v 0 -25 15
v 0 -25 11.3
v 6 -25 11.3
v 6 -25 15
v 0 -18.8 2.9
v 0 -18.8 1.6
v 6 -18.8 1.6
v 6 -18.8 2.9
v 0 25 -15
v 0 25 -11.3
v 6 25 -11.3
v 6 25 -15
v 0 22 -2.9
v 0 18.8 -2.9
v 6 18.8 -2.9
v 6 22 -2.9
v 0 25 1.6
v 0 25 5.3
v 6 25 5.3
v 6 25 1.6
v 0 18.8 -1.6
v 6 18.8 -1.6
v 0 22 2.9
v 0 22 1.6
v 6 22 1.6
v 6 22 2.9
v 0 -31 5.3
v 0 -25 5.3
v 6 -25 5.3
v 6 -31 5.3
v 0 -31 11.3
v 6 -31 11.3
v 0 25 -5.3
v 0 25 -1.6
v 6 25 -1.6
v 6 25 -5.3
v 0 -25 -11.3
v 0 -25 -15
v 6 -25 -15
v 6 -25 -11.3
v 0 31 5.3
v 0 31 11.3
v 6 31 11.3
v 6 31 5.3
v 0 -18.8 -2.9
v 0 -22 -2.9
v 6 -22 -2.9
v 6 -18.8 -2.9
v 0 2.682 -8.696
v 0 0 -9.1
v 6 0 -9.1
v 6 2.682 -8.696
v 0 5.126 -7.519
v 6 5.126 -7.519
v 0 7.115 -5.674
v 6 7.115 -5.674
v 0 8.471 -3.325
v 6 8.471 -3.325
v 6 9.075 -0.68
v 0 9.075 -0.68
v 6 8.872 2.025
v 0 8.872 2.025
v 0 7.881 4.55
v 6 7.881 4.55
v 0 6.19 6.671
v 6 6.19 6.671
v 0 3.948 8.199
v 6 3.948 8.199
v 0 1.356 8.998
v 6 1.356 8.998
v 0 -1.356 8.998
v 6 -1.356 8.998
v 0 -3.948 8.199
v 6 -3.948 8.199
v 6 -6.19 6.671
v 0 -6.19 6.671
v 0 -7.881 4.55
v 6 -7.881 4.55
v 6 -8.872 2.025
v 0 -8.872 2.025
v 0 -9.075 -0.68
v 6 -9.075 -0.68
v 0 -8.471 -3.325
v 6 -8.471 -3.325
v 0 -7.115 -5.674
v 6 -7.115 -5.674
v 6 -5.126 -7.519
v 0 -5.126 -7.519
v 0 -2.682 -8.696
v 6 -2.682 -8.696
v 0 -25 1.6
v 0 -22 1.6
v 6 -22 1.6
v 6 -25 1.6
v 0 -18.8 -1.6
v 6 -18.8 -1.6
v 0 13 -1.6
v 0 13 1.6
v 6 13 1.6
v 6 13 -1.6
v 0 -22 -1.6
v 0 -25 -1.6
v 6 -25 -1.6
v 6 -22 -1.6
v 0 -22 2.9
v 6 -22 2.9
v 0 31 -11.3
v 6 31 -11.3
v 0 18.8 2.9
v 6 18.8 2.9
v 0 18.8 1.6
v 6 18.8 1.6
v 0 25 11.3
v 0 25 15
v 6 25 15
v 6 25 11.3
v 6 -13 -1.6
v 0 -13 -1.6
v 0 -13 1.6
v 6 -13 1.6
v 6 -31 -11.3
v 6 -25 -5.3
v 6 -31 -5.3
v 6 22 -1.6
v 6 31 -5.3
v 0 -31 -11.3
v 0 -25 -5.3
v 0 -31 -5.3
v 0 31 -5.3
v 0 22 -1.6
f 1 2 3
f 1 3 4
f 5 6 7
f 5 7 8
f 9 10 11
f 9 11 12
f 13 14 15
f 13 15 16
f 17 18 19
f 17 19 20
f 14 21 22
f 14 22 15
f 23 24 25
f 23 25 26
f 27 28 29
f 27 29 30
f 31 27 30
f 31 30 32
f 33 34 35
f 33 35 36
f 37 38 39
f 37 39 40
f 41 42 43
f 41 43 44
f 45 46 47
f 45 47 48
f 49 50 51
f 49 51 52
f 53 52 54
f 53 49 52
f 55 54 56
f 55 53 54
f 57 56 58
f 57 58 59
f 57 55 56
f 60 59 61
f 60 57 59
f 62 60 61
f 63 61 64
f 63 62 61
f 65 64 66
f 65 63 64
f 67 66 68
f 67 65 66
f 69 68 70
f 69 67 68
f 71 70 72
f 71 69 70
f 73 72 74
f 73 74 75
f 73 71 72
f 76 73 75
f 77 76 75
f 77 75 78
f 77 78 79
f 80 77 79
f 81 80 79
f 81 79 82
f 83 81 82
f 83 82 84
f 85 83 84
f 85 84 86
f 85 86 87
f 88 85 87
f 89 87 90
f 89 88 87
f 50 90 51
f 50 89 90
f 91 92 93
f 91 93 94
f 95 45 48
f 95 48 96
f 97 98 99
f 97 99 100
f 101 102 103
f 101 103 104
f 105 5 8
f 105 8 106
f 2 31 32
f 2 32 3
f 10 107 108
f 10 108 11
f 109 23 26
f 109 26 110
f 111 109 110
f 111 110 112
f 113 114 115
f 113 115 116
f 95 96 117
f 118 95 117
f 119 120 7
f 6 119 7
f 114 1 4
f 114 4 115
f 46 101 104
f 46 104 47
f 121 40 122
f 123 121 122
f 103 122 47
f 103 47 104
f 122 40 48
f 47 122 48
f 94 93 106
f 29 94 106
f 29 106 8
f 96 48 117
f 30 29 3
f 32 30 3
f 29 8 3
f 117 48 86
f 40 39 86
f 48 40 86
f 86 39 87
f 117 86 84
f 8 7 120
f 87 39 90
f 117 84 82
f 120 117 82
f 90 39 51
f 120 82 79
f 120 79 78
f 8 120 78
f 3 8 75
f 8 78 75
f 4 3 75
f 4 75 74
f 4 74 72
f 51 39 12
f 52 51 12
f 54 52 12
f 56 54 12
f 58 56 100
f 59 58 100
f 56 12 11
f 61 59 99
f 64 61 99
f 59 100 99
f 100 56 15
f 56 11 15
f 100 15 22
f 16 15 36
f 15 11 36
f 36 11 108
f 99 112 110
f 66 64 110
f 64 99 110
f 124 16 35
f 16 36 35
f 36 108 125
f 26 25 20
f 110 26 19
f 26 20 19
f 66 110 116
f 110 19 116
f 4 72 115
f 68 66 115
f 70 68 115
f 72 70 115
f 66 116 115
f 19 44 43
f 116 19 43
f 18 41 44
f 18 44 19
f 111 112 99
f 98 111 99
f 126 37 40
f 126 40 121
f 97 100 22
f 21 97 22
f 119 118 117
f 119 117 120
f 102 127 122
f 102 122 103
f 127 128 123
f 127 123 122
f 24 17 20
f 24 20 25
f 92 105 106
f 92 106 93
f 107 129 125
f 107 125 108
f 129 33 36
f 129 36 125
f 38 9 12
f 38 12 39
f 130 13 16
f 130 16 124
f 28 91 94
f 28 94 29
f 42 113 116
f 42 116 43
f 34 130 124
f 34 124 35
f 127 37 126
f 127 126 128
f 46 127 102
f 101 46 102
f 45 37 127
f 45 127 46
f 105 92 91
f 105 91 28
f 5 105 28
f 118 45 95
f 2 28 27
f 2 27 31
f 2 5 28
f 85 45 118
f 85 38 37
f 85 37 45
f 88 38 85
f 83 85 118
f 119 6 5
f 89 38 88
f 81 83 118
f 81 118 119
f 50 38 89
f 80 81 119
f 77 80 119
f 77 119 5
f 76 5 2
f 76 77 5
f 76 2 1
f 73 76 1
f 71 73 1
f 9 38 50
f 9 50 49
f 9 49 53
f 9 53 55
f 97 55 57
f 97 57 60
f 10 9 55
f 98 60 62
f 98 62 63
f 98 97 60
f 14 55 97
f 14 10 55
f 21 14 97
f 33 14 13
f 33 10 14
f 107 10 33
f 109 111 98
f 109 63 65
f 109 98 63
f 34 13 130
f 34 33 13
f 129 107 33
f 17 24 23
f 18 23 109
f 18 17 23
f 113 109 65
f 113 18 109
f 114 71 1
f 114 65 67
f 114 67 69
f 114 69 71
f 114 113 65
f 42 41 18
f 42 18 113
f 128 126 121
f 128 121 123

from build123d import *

# Parameters (mm, degrees)
SKETCH1_R           = 9.1
BOSS_EXTRUDE1_DEPTH = 6


with BuildPart() as part:
    # Sketch1 → Boss-Extrude1 (new body)
    with BuildSketch(Plane(origin=(0, 0, 0), x_dir=(0, 0, -1), z_dir=(1, 0, 0))):
        Polygon((-15, -25), (-15, 25), (-11.3, 25), (-11.3, 31), (-5.3, 31), (-5.3, 25), (-1.6, 25), (-1.6, 22), (-2.9, 22), (-2.9, 18.8), (-1.6, 18.8), (-1.6, 13), (1.6, 13), (1.6, 18.8), (2.9, 18.8), (2.9, 22), (1.6, 22), (1.6, 25), (5.3, 25), (5.3, 31), (11.3, 31), (11.3, 25), (15, 25), (15, -25), (11.3, -25), (11.3, -31), (5.3, -31), (5.3, -25), (1.6, -25), (1.6, -22), (2.9, -22), (2.9, -18.8), (1.6, -18.8), (1.6, -13), (-1.6, -13), (-1.6, -18.8), (-2.9, -18.8), (-2.9, -22), (-1.6, -22), (-1.6, -25), (-5.3, -25), (-5.3, -31), (-11.3, -31), (-11.3, -25), align=None)
        Circle(SKETCH1_R, mode=Mode.SUBTRACT)
    extrude(amount=BOSS_EXTRUDE1_DEPTH)


solid = part.part
